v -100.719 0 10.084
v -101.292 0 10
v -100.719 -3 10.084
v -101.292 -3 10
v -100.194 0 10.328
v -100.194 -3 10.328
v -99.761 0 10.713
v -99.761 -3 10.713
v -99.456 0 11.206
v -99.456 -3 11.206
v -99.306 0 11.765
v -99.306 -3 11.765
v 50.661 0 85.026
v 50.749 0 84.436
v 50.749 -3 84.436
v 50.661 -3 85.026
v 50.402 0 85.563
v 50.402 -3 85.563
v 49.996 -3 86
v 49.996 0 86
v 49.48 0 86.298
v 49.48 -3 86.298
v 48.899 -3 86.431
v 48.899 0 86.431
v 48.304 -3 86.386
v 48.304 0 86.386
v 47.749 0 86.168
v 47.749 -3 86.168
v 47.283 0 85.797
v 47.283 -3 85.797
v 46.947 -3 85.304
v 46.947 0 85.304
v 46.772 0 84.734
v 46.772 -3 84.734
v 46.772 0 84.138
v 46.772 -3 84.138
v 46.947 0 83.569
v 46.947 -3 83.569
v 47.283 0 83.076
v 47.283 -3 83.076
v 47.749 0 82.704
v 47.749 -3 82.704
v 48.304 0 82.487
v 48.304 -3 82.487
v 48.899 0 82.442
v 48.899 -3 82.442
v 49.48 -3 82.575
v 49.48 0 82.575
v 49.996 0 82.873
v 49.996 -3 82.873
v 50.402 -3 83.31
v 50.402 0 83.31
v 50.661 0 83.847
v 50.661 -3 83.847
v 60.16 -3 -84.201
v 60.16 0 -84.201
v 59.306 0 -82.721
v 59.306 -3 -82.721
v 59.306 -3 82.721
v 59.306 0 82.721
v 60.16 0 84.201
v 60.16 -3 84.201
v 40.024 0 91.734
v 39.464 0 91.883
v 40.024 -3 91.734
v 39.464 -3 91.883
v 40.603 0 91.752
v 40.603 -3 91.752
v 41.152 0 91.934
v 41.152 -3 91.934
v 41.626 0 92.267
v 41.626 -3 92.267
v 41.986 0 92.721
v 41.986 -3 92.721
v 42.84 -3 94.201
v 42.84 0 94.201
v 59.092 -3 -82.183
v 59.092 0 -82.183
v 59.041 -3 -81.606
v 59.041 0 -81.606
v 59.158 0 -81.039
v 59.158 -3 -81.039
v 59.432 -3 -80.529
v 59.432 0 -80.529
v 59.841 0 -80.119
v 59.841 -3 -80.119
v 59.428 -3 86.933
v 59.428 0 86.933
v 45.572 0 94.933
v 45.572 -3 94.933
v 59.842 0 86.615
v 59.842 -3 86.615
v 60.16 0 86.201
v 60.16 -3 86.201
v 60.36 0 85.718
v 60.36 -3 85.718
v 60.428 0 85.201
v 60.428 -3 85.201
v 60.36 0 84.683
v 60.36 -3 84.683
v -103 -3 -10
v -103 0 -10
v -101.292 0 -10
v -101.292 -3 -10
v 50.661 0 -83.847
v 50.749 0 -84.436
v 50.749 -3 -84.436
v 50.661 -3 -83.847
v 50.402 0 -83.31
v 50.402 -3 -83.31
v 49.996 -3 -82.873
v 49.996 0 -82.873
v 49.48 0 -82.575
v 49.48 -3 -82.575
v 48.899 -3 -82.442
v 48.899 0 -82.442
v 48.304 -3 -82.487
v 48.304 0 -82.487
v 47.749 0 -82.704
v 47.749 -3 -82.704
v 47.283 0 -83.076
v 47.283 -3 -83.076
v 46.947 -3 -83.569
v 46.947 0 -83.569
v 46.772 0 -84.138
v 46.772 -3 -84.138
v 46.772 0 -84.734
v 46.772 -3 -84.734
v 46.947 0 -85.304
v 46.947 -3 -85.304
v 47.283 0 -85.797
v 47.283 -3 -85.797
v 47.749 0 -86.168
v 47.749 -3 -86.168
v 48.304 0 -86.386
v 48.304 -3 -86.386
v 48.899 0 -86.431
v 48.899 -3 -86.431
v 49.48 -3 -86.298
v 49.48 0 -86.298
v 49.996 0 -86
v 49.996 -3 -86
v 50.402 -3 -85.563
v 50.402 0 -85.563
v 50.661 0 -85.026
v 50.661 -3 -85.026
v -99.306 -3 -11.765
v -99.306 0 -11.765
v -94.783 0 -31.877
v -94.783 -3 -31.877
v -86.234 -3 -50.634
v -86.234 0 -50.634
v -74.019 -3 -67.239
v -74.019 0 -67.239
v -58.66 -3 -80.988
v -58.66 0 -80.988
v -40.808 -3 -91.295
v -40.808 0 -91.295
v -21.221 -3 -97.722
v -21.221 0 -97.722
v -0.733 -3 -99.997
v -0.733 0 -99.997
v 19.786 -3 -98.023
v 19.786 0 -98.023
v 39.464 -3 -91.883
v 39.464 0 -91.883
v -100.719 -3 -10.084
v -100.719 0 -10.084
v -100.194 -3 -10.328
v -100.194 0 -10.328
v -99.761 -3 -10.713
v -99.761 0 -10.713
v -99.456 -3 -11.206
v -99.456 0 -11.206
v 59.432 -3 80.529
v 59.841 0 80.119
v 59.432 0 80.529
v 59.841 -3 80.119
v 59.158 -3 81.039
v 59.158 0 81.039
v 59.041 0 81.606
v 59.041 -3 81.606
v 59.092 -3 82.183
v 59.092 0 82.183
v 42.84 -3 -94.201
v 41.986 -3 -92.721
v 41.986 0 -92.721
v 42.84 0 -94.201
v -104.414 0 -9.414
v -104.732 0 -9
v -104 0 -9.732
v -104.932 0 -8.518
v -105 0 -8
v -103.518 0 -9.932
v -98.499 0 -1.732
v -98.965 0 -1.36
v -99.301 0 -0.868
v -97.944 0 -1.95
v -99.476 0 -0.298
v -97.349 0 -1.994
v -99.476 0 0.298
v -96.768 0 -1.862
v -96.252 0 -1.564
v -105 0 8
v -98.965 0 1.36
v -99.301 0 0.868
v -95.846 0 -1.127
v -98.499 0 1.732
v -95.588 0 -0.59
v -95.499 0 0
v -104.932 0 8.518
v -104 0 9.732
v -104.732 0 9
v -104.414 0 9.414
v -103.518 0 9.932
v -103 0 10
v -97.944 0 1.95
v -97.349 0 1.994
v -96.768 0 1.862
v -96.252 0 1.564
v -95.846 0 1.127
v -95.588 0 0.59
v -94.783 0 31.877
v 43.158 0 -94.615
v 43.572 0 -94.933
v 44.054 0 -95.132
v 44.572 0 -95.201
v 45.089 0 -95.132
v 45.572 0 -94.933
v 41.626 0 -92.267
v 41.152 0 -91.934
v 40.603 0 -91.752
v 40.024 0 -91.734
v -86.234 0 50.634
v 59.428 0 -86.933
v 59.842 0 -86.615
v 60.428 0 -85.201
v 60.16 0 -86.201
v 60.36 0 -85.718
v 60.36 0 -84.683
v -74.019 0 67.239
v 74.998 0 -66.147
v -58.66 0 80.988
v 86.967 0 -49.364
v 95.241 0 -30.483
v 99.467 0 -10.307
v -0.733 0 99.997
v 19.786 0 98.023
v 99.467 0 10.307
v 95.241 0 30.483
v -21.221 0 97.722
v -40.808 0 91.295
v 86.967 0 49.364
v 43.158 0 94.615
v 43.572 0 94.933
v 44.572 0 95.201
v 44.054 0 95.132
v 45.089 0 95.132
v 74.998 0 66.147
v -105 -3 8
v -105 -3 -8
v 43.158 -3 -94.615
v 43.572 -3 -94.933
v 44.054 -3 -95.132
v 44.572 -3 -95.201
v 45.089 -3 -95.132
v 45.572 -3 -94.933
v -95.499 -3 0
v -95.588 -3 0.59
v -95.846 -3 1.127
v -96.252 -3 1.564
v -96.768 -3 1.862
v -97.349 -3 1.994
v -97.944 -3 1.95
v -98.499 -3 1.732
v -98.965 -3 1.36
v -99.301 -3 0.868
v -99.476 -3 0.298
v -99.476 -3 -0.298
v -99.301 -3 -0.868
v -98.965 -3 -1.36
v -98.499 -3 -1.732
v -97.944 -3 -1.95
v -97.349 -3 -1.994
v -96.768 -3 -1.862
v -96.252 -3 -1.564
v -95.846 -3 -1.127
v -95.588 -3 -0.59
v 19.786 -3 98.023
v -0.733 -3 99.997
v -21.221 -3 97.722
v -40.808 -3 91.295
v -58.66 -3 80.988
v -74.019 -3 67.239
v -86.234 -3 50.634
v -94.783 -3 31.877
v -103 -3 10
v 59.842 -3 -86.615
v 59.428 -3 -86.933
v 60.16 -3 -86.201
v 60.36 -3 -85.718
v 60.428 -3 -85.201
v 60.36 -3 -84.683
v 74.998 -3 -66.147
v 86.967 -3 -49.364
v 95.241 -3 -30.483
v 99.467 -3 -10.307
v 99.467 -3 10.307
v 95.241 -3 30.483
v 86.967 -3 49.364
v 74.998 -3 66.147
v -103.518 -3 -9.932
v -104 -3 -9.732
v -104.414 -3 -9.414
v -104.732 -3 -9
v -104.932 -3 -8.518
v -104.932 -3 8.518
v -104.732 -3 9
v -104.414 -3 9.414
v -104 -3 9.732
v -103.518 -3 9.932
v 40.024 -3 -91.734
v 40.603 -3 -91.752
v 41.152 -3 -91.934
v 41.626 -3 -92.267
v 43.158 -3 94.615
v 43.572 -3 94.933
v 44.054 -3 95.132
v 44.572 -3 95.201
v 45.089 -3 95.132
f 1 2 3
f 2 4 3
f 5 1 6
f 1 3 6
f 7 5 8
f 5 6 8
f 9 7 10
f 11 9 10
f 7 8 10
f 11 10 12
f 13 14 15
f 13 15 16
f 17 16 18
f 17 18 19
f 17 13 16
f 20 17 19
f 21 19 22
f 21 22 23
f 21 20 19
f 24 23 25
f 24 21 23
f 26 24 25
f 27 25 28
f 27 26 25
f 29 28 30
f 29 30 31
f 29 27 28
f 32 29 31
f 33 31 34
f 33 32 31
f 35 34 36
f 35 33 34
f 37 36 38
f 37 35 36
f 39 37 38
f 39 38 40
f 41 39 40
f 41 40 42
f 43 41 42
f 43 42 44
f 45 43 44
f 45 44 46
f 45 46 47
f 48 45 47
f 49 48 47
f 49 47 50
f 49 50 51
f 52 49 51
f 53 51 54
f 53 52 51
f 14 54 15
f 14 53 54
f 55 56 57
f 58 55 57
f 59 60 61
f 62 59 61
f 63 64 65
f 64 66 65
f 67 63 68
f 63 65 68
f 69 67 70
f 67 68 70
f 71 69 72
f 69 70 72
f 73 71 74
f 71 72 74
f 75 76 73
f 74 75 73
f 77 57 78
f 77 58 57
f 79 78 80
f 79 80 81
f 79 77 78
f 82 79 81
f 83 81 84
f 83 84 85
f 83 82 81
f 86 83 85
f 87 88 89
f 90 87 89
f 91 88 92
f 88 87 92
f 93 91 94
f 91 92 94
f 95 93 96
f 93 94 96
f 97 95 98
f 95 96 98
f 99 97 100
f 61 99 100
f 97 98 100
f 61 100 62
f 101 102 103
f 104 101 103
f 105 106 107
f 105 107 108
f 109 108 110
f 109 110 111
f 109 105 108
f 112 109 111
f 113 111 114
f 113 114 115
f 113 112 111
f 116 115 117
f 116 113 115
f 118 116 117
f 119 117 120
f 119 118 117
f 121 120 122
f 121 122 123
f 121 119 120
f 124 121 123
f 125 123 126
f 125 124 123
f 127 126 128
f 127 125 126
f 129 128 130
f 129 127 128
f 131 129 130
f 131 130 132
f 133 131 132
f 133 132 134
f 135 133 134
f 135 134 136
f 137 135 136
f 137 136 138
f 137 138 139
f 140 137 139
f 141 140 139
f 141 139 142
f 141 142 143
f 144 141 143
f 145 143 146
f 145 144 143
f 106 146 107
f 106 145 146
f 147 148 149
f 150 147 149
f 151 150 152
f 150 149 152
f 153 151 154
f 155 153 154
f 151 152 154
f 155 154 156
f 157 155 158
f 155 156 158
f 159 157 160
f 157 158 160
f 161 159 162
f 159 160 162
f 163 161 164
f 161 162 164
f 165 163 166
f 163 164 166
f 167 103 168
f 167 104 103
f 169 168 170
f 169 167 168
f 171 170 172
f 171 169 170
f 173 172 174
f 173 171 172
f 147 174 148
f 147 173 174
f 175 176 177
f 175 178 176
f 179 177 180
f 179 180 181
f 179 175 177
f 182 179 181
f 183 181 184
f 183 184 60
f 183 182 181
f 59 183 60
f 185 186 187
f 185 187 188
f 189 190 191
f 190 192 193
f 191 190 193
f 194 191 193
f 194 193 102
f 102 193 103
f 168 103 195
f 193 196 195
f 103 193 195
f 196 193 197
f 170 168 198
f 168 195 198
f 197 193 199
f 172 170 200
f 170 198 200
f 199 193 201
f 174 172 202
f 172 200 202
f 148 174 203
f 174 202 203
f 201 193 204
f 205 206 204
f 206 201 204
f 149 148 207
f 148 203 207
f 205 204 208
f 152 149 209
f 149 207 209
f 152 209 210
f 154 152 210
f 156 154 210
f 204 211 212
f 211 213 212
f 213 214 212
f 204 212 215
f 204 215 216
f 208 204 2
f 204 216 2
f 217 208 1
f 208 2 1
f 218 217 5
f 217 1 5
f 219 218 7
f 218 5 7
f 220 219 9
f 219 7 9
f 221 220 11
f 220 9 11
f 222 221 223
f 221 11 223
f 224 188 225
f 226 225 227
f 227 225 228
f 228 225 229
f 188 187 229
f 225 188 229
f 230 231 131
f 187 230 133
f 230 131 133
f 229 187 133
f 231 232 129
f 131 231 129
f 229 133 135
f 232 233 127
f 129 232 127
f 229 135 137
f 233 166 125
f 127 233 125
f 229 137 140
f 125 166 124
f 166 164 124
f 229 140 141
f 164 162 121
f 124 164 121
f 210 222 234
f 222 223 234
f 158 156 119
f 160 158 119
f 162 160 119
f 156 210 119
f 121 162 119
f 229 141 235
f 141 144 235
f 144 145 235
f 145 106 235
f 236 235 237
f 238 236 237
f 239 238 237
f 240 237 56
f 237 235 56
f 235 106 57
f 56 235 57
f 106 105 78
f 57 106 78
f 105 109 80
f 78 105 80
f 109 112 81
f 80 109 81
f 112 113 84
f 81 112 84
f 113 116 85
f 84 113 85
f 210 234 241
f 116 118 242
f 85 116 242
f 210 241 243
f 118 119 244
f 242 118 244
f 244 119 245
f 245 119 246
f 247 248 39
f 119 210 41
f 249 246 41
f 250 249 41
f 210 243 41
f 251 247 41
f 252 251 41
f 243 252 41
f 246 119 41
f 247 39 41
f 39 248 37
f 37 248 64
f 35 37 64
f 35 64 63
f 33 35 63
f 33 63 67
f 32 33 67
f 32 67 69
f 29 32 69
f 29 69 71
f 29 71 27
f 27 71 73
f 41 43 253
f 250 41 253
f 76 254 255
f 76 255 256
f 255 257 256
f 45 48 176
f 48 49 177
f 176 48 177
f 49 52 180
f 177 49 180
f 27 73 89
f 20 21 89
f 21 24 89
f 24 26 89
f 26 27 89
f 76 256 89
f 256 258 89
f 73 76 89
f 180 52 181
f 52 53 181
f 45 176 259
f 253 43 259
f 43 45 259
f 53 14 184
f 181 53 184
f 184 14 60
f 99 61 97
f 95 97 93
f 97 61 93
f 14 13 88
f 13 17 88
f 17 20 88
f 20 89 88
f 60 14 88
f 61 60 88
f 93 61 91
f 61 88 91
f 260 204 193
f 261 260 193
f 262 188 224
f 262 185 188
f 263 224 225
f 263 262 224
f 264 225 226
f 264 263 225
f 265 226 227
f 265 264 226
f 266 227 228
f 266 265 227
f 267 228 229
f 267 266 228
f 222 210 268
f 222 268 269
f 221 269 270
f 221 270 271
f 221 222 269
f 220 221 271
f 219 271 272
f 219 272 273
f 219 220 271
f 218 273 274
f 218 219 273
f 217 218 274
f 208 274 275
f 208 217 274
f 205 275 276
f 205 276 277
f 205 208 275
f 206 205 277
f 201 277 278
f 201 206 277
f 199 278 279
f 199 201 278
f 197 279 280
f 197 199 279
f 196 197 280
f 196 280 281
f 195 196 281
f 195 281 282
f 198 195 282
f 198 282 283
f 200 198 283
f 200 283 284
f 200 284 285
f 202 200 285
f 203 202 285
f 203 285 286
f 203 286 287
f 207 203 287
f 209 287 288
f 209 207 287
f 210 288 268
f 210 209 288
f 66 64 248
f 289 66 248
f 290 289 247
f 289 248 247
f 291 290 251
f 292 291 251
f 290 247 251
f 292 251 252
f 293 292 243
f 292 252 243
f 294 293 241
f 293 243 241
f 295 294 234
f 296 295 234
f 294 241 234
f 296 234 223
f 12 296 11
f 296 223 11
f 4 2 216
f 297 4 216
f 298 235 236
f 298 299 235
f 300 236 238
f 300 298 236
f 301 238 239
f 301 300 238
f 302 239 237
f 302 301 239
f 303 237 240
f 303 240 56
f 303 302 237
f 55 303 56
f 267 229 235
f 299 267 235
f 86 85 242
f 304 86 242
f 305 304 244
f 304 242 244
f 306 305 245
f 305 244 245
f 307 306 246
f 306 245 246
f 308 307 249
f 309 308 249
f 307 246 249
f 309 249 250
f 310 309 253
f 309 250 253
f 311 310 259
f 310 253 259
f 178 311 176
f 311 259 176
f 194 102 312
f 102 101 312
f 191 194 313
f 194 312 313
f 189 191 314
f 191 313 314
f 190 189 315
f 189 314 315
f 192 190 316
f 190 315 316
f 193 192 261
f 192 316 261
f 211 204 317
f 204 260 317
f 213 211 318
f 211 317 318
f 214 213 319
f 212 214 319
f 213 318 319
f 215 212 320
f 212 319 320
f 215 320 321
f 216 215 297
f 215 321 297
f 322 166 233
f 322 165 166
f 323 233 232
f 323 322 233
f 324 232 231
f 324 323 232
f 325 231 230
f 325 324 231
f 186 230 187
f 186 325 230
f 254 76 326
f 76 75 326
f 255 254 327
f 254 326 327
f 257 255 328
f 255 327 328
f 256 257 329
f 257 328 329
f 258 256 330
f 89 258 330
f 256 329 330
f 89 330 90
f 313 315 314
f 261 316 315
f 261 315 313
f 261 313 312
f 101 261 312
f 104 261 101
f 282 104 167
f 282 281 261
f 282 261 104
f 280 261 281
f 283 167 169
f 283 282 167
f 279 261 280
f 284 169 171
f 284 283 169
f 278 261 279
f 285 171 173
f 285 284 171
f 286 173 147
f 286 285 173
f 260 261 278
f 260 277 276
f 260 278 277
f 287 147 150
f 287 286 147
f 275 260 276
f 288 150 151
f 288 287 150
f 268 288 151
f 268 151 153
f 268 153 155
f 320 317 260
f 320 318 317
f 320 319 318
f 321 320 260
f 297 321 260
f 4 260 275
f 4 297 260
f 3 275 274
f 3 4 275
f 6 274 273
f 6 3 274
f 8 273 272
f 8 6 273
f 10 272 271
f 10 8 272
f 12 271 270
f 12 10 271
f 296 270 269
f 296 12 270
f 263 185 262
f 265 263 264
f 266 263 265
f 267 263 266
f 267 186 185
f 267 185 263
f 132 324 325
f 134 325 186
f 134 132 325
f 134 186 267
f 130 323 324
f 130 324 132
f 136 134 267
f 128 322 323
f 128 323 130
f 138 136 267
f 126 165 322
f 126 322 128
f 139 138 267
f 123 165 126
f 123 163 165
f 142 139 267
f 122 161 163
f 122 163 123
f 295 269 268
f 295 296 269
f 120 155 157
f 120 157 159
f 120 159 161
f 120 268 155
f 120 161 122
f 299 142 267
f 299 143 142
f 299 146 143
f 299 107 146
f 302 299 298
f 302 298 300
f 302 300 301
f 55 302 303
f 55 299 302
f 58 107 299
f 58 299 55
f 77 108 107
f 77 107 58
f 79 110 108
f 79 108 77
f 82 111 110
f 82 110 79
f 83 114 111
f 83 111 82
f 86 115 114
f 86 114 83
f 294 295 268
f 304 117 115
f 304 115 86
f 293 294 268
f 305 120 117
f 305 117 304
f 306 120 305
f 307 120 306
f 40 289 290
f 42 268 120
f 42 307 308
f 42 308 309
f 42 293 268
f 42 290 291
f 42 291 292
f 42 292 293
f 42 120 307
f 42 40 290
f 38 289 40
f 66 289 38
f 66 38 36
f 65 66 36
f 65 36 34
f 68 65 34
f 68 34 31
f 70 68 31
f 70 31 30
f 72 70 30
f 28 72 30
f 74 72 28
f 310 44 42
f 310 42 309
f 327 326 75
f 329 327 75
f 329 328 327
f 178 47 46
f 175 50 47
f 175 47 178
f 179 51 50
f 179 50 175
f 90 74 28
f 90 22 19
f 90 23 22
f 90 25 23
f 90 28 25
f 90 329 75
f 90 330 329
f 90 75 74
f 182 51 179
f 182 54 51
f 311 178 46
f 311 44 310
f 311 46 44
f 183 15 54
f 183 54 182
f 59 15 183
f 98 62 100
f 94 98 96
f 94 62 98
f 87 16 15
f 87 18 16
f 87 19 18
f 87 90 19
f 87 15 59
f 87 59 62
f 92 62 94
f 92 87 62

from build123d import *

# Parameters (mm, degrees)
F0_R     = 2
F1_DEPTH = 3
F2_R     = 2
F3_R     = 2


with BuildPart() as f1:
    # F0 (on Front) → F1 (new body)
    with BuildSketch(Plane.XZ):
        with BuildLine():
            Line((-105, -10), (-99.498744, -10))
            ThreePointArc((-99.498744, -10), (-50, -86.60254), (41.089118, -91.16844))
            Line((41.089118, -91.16844), (43.839746, -95.932667))
            Line((43.839746, -95.932667), (61.160254, -85.932667))
            Line((61.160254, -85.932667), (58.409626, -81.16844))
            ThreePointArc((58.409626, -81.16844), (100, 0), (58.409626, 81.16844))
            Line((58.409626, 81.16844), (61.160254, 85.932667))
            Line((61.160254, 85.932667), (43.839746, 95.932667))
            Line((43.839746, 95.932667), (41.089118, 91.16844))
            ThreePointArc((41.089118, 91.16844), (-50, 86.60254), (-99.498744, 10))
            Line((-99.498744, 10), (-105, 10))
            Line((-105, 10), (-105, -10))
        make_face()
        with Locations((48.749372, -84.436389)):
            Circle(F0_R, mode=Mode.SUBTRACT)
        with Locations((-97.498744, 0)):
            Circle(F0_R, mode=Mode.SUBTRACT)
        with Locations((48.749372, 84.436389)):
            Circle(F0_R, mode=Mode.SUBTRACT)
    extrude(amount=F1_DEPTH)

    # F2
    f2_edges = [f1.edges().sort_by_distance(p)[0] for p in [
        (58.409626, -1.5, 81.16844),
        (41.089118, -1.5, 91.16844),
        (58.409626, -1.5, -81.16844),
        (41.089118, -1.5, -91.16844),
        (-99.498744, -1.5, -10),
        (-99.498744, -1.5, 10),
    ]]
    fillet(f2_edges, radius=F2_R)

    # F3
    f3_edges = [f1.edges().sort_by_distance(p)[0] for p in [
        (61.160254, -1.5, 85.932667),
        (43.839746, -1.5, 95.932667),
        (-105, -1.5, 10),
        (-105, -1.5, -10),
        (43.839746, -1.5, -95.932667),
        (61.160254, -1.5, -85.932667),
    ]]
    fillet(f3_edges, radius=F3_R)


solid = f1.part
